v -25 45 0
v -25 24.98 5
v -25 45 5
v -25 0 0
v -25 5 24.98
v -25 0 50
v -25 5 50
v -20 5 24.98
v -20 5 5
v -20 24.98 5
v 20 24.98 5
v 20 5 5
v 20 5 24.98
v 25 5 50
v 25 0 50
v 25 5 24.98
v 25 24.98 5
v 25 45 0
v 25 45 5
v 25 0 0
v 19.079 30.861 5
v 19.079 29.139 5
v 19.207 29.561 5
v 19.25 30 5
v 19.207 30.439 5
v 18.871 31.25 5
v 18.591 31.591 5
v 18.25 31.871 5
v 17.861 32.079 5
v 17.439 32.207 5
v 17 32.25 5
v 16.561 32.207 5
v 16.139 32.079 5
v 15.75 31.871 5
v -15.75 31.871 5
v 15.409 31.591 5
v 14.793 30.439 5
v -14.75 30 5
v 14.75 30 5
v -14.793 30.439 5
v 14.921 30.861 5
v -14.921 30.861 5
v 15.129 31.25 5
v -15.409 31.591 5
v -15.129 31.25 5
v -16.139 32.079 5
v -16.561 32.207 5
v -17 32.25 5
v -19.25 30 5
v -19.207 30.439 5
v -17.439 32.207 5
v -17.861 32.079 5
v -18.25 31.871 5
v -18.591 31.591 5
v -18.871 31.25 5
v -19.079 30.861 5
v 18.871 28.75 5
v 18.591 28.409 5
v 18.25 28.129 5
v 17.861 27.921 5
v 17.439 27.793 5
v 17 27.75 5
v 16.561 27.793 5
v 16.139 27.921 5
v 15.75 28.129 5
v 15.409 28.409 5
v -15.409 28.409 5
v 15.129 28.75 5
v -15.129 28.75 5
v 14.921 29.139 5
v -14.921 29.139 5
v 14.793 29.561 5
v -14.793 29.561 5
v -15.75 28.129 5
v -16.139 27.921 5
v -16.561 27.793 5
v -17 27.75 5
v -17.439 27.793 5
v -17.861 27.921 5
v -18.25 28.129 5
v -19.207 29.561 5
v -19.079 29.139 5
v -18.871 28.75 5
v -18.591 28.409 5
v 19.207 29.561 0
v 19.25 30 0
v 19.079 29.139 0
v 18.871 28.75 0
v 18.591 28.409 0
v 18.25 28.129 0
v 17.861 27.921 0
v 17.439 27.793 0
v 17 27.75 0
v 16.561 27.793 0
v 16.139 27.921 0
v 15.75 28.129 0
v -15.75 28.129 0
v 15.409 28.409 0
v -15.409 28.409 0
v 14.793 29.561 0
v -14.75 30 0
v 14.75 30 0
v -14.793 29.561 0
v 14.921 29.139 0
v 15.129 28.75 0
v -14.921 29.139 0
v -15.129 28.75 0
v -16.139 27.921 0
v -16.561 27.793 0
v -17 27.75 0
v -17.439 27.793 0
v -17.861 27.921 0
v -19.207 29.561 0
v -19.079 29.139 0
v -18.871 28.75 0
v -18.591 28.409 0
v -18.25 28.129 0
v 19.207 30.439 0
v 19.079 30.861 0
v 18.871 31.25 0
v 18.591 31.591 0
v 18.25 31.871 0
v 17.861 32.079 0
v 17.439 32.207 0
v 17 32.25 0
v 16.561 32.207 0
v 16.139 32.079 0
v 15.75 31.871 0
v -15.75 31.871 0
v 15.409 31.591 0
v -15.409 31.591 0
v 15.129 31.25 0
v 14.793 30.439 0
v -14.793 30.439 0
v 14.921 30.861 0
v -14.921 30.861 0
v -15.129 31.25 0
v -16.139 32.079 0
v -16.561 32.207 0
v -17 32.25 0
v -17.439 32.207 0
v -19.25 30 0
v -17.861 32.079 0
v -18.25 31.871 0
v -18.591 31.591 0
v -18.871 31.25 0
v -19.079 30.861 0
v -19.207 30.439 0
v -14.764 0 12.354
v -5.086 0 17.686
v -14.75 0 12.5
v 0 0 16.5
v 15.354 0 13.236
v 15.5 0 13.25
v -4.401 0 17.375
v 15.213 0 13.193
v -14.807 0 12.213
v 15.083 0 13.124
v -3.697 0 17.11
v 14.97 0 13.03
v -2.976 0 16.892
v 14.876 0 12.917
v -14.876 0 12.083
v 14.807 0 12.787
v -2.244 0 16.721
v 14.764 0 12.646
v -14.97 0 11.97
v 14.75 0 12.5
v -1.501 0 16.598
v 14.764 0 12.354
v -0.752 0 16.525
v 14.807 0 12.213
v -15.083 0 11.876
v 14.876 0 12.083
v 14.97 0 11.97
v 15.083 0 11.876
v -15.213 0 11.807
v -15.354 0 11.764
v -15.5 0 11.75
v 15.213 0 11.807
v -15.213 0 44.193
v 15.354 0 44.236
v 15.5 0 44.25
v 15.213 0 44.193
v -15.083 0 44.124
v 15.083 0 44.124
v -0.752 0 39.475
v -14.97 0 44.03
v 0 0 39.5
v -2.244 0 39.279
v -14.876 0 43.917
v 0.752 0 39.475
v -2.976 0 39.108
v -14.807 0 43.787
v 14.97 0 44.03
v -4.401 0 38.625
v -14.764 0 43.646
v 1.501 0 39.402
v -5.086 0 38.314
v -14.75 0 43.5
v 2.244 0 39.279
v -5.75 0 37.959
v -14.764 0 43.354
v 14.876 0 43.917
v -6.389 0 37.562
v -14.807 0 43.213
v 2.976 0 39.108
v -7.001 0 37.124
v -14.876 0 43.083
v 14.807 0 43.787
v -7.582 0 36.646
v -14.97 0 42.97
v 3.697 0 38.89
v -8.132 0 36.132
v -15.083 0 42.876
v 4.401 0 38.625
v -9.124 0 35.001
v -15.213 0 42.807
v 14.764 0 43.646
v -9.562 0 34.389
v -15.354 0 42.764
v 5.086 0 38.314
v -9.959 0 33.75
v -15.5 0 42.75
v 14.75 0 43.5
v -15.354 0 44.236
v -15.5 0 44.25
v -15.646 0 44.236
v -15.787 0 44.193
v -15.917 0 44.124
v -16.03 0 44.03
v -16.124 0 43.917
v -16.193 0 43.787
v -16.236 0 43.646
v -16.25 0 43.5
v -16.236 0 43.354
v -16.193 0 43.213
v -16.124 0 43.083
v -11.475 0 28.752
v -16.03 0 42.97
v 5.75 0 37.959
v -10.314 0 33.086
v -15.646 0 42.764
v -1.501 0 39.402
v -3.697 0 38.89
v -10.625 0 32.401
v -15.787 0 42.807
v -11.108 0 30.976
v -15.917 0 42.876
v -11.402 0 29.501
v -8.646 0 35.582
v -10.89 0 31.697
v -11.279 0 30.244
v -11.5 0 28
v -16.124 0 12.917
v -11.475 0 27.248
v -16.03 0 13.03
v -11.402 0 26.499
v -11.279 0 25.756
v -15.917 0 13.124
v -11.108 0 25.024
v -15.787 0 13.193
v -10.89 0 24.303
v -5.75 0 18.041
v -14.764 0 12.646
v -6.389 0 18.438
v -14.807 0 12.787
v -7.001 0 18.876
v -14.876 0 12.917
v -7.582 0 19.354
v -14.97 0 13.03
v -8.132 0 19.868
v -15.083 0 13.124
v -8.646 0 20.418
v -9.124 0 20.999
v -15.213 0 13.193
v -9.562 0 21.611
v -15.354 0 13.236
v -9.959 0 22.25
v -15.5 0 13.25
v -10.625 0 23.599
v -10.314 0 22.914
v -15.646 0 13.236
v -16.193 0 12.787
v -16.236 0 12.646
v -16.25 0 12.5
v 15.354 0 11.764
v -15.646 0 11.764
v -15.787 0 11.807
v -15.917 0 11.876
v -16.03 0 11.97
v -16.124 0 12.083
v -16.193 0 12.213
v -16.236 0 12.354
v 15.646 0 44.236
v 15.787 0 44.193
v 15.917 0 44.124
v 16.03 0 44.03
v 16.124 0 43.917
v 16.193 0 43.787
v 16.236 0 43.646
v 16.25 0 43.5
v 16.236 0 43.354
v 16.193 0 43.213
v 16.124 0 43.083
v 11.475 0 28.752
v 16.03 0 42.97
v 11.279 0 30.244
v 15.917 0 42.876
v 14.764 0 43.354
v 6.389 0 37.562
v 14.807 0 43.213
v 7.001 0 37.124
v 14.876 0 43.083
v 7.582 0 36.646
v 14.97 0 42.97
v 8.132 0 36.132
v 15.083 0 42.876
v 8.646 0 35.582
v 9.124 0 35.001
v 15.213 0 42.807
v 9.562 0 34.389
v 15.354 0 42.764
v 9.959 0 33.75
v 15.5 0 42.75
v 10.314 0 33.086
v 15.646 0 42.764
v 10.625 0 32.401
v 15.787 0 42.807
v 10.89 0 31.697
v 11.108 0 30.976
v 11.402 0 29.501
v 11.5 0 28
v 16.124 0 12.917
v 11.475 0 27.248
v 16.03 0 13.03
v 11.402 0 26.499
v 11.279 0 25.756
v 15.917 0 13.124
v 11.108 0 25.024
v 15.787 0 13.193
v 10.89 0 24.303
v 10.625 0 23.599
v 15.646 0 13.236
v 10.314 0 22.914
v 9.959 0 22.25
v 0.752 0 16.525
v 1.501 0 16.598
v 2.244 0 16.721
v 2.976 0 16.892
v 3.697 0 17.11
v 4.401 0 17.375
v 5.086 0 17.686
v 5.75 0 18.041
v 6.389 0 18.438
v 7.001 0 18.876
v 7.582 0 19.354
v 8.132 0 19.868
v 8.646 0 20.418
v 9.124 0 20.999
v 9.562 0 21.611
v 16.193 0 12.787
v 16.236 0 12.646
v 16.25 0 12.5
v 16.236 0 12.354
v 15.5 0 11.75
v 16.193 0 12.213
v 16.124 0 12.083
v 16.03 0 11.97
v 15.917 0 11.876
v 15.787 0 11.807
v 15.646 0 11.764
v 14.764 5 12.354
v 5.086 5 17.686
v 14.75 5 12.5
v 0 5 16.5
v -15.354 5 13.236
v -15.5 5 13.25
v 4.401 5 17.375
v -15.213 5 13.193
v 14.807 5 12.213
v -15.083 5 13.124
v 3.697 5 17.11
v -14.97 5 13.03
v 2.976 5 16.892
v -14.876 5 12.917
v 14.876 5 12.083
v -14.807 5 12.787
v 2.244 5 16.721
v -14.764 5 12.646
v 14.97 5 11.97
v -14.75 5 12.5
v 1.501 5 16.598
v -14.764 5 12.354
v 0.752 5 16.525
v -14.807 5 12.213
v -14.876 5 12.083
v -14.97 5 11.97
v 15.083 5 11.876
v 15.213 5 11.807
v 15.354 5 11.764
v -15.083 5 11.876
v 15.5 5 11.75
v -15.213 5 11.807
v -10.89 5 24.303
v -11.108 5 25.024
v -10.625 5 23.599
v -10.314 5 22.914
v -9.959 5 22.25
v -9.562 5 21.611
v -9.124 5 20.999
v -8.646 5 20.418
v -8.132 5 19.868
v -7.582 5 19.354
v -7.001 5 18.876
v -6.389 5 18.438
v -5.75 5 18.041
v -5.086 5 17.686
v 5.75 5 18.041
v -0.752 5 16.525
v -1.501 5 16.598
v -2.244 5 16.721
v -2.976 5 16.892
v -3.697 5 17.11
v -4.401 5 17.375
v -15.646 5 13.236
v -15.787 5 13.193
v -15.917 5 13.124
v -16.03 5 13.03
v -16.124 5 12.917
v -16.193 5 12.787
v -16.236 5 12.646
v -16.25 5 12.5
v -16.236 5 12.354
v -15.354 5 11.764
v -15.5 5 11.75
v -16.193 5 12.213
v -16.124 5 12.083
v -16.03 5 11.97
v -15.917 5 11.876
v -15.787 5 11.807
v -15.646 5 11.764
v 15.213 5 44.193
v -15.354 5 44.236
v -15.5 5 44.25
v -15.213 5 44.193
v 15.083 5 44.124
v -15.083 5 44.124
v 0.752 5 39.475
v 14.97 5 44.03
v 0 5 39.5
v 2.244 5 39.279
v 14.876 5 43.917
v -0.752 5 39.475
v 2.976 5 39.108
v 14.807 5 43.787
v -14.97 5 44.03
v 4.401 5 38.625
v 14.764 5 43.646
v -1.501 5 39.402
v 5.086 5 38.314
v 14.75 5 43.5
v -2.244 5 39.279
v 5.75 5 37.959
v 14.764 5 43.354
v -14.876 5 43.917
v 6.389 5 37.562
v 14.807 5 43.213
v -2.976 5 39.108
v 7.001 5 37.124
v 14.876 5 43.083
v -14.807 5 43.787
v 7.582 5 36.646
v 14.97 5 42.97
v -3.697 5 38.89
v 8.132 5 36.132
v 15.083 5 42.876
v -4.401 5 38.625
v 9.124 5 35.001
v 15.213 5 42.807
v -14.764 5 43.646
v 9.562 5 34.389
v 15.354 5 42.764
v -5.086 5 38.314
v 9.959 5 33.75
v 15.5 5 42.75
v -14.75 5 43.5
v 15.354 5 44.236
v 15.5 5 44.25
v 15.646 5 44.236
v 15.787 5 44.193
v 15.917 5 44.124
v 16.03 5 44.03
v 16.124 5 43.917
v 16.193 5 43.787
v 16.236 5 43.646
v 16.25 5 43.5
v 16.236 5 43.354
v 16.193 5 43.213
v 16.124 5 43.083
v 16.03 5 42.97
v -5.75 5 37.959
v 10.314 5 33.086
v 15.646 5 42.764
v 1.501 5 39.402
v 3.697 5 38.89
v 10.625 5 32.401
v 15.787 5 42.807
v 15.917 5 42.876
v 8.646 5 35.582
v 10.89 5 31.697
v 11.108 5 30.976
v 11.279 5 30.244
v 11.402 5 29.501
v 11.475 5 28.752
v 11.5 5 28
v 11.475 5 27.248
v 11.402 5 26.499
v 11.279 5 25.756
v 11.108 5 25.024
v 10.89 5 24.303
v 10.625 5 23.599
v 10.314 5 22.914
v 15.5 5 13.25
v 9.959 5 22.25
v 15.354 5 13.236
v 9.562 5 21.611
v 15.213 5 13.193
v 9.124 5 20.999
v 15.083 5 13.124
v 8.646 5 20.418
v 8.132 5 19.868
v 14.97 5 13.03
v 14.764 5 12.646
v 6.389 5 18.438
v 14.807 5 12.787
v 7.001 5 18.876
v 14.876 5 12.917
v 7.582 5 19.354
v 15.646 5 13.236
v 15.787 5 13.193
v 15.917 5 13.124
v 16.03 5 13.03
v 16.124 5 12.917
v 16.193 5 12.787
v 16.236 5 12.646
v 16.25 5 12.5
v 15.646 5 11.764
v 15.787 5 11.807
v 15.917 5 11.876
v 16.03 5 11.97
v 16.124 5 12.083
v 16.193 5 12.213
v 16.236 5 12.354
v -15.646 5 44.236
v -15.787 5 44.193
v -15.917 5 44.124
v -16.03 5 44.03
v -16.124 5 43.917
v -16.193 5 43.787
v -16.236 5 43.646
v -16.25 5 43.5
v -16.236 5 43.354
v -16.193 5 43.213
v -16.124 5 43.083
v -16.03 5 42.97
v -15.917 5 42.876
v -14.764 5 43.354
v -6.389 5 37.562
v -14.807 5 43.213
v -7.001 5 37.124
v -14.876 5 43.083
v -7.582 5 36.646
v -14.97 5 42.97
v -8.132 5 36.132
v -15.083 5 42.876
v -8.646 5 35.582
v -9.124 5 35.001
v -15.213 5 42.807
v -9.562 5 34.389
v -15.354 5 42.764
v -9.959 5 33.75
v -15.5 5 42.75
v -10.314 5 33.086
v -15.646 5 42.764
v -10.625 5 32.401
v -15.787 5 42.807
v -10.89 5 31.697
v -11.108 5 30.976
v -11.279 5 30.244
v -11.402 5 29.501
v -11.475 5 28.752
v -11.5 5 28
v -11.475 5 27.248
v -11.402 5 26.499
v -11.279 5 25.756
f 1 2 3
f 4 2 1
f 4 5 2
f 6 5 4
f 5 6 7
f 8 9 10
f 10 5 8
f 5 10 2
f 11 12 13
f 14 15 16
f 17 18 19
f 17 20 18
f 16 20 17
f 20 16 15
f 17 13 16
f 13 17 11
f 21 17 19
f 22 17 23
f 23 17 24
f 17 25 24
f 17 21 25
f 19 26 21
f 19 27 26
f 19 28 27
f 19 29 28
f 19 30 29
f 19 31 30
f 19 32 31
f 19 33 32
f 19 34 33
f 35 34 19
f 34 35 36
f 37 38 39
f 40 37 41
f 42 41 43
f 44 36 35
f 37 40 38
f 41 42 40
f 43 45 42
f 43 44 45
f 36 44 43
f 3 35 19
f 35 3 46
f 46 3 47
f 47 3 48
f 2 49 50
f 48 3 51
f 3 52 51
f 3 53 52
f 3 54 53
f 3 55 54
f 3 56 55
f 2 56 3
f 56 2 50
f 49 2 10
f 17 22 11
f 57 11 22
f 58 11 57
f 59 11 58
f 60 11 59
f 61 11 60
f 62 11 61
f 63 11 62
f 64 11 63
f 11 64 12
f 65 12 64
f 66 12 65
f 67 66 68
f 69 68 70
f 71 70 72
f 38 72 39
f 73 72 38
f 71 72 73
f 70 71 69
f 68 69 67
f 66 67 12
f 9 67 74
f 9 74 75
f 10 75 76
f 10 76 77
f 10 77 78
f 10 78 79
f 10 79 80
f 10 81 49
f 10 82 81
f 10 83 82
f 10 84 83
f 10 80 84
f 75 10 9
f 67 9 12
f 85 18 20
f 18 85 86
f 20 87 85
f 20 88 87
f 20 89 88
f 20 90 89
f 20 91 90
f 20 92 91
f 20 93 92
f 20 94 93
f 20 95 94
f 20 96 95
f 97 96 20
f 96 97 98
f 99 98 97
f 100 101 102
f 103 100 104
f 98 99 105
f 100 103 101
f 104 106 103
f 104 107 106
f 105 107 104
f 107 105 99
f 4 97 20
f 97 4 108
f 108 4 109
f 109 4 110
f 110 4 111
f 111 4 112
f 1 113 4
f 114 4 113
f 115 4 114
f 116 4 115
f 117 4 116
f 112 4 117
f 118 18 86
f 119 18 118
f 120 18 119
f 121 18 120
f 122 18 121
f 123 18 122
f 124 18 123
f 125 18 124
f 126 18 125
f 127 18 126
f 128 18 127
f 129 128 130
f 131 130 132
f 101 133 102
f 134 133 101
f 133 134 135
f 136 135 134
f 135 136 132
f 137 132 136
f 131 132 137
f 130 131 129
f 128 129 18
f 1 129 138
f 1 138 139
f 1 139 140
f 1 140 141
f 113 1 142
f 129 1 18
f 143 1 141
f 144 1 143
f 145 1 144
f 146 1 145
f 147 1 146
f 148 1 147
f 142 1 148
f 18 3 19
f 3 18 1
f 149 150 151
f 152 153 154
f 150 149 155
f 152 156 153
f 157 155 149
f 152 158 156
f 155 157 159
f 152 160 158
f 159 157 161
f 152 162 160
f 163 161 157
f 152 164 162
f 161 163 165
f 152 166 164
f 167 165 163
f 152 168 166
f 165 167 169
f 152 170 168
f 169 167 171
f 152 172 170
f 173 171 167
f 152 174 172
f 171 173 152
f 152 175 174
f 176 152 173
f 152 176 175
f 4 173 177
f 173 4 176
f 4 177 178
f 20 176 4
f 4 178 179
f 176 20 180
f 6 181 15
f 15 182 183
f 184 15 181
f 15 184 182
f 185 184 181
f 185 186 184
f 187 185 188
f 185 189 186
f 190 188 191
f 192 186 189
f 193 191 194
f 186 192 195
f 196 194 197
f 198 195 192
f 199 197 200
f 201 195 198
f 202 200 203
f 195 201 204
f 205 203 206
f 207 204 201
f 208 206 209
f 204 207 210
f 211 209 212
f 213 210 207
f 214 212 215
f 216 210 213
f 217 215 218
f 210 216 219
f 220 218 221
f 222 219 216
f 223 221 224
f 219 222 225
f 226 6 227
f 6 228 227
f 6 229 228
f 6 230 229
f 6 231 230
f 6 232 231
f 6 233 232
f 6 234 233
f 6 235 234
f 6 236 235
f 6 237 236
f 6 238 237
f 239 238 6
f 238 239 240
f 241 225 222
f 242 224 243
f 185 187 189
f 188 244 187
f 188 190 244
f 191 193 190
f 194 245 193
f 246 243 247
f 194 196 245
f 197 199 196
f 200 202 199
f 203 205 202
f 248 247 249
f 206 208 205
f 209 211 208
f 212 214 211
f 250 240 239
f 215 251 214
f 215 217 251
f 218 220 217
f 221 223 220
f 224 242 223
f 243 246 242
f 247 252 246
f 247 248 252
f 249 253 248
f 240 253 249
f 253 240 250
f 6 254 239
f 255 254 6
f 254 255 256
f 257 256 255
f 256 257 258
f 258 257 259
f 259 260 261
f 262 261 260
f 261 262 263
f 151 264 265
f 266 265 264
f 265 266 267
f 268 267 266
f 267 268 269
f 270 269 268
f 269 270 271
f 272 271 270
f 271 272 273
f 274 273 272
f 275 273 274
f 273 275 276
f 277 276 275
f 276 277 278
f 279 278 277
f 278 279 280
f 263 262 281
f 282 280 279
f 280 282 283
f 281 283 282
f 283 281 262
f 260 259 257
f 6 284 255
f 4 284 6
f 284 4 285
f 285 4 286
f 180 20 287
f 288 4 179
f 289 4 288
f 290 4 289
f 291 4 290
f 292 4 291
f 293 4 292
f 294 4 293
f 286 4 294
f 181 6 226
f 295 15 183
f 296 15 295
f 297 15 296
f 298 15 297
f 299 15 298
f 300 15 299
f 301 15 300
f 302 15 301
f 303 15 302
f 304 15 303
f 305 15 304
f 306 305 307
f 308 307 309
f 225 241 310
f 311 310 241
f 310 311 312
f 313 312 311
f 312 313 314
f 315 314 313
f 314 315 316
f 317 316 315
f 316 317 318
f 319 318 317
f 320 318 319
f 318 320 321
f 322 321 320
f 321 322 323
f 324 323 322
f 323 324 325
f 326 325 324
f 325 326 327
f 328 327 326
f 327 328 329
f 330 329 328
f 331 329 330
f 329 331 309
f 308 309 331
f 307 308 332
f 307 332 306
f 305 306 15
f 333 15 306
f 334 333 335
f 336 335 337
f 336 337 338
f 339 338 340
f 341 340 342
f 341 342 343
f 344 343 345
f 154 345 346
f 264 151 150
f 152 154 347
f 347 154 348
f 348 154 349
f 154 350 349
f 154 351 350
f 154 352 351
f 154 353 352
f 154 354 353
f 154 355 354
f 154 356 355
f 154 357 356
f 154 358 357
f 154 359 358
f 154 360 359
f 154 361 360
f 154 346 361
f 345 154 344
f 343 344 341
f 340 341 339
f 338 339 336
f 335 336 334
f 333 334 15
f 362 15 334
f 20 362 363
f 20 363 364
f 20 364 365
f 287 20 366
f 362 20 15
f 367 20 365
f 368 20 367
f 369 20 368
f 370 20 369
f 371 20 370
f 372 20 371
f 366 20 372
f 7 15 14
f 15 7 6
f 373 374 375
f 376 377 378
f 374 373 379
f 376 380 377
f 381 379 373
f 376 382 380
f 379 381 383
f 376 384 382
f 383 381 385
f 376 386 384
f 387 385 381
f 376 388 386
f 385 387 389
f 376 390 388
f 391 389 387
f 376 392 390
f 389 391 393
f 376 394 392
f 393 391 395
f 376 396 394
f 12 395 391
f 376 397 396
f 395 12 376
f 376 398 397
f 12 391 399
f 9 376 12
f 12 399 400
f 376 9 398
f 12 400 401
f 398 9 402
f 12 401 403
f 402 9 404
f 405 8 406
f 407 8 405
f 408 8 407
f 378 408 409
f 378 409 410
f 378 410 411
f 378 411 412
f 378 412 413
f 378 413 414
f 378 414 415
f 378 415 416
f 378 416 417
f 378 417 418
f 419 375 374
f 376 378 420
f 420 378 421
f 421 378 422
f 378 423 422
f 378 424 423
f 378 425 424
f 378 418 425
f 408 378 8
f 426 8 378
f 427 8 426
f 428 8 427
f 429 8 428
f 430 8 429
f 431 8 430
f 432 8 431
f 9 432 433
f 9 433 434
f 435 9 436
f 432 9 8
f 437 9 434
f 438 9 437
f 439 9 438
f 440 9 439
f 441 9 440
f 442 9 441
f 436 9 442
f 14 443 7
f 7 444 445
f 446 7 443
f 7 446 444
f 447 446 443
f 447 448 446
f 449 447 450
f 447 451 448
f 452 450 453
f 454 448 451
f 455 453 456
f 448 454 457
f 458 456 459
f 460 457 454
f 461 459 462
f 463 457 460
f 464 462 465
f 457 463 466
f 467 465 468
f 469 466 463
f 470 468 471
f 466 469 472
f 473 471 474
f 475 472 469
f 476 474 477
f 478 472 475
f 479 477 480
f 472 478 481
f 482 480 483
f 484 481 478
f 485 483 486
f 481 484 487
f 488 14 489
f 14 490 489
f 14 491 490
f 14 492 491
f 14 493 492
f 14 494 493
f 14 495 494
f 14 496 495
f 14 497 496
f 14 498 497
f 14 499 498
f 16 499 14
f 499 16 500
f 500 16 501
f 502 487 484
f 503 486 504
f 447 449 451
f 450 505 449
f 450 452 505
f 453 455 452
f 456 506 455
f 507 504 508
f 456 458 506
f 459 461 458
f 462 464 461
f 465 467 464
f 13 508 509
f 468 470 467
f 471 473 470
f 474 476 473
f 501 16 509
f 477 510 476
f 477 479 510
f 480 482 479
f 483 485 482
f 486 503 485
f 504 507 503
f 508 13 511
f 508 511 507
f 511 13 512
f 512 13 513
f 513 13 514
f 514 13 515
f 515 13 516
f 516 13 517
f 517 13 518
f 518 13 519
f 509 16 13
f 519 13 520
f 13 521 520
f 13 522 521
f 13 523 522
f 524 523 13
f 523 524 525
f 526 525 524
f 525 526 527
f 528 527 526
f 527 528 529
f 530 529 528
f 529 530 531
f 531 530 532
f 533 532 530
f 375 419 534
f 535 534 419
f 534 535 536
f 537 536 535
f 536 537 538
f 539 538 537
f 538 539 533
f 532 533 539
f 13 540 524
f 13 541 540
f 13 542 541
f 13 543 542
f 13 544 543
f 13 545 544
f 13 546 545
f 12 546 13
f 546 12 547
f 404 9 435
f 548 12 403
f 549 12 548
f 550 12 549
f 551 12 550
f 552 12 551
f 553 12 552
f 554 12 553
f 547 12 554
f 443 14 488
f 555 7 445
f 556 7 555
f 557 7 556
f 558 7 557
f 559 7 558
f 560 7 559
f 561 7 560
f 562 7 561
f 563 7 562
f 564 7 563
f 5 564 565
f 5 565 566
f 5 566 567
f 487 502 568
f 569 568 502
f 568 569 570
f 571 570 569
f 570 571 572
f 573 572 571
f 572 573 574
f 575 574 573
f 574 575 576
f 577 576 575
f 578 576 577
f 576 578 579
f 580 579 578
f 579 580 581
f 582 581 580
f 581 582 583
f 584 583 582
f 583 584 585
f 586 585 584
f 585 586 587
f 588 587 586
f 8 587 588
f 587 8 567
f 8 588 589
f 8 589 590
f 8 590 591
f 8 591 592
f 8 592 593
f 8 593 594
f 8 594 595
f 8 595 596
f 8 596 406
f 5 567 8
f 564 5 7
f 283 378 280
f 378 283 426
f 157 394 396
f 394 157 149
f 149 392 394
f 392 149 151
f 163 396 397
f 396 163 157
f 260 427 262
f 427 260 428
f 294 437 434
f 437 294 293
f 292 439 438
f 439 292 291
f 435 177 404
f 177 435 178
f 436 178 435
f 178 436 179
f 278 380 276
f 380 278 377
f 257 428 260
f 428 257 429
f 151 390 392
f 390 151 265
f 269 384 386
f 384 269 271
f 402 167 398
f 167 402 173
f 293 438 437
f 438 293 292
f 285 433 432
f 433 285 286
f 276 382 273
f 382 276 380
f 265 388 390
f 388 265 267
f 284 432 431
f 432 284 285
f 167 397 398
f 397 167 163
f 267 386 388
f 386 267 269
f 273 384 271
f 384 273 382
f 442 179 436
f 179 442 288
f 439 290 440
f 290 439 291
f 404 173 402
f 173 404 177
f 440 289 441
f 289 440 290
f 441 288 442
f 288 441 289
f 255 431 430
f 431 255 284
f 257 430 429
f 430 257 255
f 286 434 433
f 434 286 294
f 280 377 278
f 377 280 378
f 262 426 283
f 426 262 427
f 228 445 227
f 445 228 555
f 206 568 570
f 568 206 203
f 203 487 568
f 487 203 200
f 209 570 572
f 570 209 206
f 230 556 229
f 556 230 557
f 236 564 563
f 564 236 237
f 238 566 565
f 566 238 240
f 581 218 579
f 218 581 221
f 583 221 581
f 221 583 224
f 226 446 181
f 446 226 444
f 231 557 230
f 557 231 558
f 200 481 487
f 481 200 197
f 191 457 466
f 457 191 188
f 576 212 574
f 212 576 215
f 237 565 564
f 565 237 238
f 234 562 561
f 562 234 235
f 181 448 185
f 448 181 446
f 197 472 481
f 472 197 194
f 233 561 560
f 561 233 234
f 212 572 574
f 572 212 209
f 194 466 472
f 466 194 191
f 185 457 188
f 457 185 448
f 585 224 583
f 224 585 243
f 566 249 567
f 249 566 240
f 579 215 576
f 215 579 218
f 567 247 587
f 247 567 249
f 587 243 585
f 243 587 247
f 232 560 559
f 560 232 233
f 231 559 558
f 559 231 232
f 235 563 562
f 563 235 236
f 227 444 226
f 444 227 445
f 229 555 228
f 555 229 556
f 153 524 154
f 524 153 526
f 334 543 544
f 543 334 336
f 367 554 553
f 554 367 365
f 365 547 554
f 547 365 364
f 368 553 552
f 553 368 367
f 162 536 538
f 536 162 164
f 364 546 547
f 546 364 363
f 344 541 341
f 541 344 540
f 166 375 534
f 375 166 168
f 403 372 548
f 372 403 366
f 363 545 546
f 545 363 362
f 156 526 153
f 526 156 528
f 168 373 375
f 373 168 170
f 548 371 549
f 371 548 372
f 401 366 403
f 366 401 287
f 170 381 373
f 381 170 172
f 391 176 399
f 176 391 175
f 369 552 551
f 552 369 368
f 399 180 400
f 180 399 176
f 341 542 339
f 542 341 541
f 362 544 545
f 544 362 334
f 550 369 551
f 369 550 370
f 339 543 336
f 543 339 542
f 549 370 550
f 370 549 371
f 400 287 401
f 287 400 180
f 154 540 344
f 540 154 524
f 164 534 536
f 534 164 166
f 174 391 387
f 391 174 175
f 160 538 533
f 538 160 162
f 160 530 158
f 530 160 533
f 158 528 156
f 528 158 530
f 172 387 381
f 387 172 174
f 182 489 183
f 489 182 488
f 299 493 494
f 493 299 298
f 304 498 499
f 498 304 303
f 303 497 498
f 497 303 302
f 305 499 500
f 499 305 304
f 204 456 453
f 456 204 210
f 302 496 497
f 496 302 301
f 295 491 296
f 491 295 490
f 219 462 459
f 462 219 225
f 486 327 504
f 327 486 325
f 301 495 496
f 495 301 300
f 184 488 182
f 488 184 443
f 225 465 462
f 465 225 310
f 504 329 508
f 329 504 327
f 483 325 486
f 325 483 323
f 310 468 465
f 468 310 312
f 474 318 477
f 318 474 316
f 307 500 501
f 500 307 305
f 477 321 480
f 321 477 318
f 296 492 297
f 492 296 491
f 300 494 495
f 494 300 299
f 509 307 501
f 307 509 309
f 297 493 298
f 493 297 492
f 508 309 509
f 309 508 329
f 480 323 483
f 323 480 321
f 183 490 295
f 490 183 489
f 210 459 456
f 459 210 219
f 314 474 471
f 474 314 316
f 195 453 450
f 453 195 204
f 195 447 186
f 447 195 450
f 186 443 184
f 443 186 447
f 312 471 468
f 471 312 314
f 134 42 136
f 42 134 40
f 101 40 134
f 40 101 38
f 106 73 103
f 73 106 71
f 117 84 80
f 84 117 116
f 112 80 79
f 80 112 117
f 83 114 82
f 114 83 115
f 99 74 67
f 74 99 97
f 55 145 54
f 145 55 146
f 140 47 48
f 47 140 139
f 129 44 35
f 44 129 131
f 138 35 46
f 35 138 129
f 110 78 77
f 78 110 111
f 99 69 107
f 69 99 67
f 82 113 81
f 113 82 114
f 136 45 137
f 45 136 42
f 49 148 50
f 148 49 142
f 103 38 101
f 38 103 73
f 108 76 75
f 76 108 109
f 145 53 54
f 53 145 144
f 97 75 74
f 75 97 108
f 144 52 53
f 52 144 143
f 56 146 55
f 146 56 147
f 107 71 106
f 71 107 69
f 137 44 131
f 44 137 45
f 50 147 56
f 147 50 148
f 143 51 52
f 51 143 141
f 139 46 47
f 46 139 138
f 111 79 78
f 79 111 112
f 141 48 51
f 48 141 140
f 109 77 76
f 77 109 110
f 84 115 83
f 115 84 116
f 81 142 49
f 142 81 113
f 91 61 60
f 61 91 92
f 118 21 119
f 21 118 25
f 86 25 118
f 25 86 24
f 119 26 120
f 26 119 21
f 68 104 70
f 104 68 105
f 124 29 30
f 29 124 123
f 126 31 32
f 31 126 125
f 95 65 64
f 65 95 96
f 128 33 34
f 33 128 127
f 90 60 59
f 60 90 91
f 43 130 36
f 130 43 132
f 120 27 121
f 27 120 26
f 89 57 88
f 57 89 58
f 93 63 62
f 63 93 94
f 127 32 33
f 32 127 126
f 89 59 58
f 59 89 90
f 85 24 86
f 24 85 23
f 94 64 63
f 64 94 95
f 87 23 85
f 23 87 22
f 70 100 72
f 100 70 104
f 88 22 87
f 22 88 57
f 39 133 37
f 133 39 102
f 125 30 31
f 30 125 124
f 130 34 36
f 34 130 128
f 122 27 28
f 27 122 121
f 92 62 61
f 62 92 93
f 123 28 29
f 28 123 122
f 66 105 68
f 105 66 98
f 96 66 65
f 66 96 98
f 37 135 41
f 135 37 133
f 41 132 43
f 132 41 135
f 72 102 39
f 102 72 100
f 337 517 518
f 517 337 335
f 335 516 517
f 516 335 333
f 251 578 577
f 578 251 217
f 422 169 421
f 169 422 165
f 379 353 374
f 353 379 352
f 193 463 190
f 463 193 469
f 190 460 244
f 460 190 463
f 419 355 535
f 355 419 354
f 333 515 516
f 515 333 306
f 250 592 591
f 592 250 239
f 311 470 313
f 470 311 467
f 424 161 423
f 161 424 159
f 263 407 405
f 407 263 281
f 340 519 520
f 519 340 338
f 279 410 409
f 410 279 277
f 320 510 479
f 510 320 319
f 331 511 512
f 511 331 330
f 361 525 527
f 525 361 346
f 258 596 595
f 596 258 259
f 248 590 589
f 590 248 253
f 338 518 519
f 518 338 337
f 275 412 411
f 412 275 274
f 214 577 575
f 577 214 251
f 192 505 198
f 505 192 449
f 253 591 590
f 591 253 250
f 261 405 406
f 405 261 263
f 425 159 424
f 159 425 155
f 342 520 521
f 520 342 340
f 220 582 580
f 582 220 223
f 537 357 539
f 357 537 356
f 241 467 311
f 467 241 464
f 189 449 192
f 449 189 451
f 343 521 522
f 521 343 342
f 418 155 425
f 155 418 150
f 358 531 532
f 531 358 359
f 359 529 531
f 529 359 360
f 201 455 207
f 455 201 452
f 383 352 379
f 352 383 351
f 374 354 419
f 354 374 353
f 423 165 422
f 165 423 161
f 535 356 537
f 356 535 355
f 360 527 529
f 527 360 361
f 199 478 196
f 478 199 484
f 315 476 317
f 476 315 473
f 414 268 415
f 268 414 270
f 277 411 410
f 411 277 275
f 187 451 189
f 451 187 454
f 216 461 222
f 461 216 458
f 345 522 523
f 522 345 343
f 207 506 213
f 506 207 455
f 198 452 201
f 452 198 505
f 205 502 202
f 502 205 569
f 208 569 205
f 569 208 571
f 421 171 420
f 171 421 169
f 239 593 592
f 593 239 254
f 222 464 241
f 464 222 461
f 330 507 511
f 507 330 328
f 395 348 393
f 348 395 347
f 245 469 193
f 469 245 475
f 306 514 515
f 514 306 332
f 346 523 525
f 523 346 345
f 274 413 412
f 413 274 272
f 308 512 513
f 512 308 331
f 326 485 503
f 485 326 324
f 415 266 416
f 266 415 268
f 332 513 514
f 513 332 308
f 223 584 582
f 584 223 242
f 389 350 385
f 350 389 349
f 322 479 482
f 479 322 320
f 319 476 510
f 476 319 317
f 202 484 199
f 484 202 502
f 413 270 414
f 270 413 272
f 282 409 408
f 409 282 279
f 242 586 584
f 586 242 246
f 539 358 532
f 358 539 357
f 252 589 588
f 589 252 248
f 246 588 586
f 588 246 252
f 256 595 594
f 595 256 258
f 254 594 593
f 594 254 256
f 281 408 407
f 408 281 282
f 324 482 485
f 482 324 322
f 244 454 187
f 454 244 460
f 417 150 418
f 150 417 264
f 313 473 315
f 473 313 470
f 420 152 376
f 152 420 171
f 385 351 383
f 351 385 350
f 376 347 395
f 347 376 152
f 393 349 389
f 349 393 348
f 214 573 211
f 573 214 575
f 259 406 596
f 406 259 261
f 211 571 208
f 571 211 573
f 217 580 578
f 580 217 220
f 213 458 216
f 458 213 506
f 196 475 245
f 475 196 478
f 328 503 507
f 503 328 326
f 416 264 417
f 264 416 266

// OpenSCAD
// L-bracket for a NEMA 17 stepper motor (syringe pumps, peristaltic pumps, shakers)
// Category: full hardware. Base plate with two M4 holes, vertical motor plate with
// the 22 mm boss hole + 31 mm M3 pattern, two gussets. Motor body mounts on the
// back (-Y) side, shaft pointing over the base.
// Print: PETG, base on the bed, 0.2 mm layers, 5 perimeters, 30 % infill.
// SPDX-License-Identifier: CERN-OHL-P-2.0

/* [Bracket] */
base = [50, 45, 5];      // X, Y, Z: spans y = 0..45
plate = [50, 5, 50];     // vertical plate at y = 0..5
boss_d = 23;             // NEMA 17 centring boss is 22 mm
boss_z = 28;             // motor axis height
screw_d = 1.5;           // M3 clearance
screw_spacing = 31;      // NEMA 17 bolt pattern
mount_d = 4.5;           // M4 clearance
mount_pos = [[-17, 30], [17, 30]];
gusset_t = 5;
gusset_len = 20;

/* [Hidden] */
eps = 0.01;

difference() {
    union() {
        translate([-base.x / 2, 0, 0]) cube(base);
        translate([-plate.x / 2, 0, 0]) cube(plate);
        for (sx = [-1, 1])
            translate([sx * (base.x / 2 - gusset_t / 2) - gusset_t / 2, plate.y - eps, base.z - eps])
                rotate([90, 0, 90]) linear_extrude(gusset_t)
                    polygon([[0, 0], [gusset_len, 0], [0, gusset_len]]);
    }
    translate([0, -1, boss_z]) rotate([-90, 0, 0]) cylinder(d = boss_d, h = plate.y + 2, $fn = 96);
    for (sx = [-1, 1], sz = [-1, 1])
        translate([sx * screw_spacing / 2, -1, boss_z + sz * screw_spacing / 2])
            rotate([-90, 0, 0]) cylinder(d = screw_d, h = plate.y + 2, $fn = 32);
    for (p = mount_pos)
        translate([p.x, p.y, -1]) cylinder(d = mount_d, h = base.z + 2, $fn = 32);
}
